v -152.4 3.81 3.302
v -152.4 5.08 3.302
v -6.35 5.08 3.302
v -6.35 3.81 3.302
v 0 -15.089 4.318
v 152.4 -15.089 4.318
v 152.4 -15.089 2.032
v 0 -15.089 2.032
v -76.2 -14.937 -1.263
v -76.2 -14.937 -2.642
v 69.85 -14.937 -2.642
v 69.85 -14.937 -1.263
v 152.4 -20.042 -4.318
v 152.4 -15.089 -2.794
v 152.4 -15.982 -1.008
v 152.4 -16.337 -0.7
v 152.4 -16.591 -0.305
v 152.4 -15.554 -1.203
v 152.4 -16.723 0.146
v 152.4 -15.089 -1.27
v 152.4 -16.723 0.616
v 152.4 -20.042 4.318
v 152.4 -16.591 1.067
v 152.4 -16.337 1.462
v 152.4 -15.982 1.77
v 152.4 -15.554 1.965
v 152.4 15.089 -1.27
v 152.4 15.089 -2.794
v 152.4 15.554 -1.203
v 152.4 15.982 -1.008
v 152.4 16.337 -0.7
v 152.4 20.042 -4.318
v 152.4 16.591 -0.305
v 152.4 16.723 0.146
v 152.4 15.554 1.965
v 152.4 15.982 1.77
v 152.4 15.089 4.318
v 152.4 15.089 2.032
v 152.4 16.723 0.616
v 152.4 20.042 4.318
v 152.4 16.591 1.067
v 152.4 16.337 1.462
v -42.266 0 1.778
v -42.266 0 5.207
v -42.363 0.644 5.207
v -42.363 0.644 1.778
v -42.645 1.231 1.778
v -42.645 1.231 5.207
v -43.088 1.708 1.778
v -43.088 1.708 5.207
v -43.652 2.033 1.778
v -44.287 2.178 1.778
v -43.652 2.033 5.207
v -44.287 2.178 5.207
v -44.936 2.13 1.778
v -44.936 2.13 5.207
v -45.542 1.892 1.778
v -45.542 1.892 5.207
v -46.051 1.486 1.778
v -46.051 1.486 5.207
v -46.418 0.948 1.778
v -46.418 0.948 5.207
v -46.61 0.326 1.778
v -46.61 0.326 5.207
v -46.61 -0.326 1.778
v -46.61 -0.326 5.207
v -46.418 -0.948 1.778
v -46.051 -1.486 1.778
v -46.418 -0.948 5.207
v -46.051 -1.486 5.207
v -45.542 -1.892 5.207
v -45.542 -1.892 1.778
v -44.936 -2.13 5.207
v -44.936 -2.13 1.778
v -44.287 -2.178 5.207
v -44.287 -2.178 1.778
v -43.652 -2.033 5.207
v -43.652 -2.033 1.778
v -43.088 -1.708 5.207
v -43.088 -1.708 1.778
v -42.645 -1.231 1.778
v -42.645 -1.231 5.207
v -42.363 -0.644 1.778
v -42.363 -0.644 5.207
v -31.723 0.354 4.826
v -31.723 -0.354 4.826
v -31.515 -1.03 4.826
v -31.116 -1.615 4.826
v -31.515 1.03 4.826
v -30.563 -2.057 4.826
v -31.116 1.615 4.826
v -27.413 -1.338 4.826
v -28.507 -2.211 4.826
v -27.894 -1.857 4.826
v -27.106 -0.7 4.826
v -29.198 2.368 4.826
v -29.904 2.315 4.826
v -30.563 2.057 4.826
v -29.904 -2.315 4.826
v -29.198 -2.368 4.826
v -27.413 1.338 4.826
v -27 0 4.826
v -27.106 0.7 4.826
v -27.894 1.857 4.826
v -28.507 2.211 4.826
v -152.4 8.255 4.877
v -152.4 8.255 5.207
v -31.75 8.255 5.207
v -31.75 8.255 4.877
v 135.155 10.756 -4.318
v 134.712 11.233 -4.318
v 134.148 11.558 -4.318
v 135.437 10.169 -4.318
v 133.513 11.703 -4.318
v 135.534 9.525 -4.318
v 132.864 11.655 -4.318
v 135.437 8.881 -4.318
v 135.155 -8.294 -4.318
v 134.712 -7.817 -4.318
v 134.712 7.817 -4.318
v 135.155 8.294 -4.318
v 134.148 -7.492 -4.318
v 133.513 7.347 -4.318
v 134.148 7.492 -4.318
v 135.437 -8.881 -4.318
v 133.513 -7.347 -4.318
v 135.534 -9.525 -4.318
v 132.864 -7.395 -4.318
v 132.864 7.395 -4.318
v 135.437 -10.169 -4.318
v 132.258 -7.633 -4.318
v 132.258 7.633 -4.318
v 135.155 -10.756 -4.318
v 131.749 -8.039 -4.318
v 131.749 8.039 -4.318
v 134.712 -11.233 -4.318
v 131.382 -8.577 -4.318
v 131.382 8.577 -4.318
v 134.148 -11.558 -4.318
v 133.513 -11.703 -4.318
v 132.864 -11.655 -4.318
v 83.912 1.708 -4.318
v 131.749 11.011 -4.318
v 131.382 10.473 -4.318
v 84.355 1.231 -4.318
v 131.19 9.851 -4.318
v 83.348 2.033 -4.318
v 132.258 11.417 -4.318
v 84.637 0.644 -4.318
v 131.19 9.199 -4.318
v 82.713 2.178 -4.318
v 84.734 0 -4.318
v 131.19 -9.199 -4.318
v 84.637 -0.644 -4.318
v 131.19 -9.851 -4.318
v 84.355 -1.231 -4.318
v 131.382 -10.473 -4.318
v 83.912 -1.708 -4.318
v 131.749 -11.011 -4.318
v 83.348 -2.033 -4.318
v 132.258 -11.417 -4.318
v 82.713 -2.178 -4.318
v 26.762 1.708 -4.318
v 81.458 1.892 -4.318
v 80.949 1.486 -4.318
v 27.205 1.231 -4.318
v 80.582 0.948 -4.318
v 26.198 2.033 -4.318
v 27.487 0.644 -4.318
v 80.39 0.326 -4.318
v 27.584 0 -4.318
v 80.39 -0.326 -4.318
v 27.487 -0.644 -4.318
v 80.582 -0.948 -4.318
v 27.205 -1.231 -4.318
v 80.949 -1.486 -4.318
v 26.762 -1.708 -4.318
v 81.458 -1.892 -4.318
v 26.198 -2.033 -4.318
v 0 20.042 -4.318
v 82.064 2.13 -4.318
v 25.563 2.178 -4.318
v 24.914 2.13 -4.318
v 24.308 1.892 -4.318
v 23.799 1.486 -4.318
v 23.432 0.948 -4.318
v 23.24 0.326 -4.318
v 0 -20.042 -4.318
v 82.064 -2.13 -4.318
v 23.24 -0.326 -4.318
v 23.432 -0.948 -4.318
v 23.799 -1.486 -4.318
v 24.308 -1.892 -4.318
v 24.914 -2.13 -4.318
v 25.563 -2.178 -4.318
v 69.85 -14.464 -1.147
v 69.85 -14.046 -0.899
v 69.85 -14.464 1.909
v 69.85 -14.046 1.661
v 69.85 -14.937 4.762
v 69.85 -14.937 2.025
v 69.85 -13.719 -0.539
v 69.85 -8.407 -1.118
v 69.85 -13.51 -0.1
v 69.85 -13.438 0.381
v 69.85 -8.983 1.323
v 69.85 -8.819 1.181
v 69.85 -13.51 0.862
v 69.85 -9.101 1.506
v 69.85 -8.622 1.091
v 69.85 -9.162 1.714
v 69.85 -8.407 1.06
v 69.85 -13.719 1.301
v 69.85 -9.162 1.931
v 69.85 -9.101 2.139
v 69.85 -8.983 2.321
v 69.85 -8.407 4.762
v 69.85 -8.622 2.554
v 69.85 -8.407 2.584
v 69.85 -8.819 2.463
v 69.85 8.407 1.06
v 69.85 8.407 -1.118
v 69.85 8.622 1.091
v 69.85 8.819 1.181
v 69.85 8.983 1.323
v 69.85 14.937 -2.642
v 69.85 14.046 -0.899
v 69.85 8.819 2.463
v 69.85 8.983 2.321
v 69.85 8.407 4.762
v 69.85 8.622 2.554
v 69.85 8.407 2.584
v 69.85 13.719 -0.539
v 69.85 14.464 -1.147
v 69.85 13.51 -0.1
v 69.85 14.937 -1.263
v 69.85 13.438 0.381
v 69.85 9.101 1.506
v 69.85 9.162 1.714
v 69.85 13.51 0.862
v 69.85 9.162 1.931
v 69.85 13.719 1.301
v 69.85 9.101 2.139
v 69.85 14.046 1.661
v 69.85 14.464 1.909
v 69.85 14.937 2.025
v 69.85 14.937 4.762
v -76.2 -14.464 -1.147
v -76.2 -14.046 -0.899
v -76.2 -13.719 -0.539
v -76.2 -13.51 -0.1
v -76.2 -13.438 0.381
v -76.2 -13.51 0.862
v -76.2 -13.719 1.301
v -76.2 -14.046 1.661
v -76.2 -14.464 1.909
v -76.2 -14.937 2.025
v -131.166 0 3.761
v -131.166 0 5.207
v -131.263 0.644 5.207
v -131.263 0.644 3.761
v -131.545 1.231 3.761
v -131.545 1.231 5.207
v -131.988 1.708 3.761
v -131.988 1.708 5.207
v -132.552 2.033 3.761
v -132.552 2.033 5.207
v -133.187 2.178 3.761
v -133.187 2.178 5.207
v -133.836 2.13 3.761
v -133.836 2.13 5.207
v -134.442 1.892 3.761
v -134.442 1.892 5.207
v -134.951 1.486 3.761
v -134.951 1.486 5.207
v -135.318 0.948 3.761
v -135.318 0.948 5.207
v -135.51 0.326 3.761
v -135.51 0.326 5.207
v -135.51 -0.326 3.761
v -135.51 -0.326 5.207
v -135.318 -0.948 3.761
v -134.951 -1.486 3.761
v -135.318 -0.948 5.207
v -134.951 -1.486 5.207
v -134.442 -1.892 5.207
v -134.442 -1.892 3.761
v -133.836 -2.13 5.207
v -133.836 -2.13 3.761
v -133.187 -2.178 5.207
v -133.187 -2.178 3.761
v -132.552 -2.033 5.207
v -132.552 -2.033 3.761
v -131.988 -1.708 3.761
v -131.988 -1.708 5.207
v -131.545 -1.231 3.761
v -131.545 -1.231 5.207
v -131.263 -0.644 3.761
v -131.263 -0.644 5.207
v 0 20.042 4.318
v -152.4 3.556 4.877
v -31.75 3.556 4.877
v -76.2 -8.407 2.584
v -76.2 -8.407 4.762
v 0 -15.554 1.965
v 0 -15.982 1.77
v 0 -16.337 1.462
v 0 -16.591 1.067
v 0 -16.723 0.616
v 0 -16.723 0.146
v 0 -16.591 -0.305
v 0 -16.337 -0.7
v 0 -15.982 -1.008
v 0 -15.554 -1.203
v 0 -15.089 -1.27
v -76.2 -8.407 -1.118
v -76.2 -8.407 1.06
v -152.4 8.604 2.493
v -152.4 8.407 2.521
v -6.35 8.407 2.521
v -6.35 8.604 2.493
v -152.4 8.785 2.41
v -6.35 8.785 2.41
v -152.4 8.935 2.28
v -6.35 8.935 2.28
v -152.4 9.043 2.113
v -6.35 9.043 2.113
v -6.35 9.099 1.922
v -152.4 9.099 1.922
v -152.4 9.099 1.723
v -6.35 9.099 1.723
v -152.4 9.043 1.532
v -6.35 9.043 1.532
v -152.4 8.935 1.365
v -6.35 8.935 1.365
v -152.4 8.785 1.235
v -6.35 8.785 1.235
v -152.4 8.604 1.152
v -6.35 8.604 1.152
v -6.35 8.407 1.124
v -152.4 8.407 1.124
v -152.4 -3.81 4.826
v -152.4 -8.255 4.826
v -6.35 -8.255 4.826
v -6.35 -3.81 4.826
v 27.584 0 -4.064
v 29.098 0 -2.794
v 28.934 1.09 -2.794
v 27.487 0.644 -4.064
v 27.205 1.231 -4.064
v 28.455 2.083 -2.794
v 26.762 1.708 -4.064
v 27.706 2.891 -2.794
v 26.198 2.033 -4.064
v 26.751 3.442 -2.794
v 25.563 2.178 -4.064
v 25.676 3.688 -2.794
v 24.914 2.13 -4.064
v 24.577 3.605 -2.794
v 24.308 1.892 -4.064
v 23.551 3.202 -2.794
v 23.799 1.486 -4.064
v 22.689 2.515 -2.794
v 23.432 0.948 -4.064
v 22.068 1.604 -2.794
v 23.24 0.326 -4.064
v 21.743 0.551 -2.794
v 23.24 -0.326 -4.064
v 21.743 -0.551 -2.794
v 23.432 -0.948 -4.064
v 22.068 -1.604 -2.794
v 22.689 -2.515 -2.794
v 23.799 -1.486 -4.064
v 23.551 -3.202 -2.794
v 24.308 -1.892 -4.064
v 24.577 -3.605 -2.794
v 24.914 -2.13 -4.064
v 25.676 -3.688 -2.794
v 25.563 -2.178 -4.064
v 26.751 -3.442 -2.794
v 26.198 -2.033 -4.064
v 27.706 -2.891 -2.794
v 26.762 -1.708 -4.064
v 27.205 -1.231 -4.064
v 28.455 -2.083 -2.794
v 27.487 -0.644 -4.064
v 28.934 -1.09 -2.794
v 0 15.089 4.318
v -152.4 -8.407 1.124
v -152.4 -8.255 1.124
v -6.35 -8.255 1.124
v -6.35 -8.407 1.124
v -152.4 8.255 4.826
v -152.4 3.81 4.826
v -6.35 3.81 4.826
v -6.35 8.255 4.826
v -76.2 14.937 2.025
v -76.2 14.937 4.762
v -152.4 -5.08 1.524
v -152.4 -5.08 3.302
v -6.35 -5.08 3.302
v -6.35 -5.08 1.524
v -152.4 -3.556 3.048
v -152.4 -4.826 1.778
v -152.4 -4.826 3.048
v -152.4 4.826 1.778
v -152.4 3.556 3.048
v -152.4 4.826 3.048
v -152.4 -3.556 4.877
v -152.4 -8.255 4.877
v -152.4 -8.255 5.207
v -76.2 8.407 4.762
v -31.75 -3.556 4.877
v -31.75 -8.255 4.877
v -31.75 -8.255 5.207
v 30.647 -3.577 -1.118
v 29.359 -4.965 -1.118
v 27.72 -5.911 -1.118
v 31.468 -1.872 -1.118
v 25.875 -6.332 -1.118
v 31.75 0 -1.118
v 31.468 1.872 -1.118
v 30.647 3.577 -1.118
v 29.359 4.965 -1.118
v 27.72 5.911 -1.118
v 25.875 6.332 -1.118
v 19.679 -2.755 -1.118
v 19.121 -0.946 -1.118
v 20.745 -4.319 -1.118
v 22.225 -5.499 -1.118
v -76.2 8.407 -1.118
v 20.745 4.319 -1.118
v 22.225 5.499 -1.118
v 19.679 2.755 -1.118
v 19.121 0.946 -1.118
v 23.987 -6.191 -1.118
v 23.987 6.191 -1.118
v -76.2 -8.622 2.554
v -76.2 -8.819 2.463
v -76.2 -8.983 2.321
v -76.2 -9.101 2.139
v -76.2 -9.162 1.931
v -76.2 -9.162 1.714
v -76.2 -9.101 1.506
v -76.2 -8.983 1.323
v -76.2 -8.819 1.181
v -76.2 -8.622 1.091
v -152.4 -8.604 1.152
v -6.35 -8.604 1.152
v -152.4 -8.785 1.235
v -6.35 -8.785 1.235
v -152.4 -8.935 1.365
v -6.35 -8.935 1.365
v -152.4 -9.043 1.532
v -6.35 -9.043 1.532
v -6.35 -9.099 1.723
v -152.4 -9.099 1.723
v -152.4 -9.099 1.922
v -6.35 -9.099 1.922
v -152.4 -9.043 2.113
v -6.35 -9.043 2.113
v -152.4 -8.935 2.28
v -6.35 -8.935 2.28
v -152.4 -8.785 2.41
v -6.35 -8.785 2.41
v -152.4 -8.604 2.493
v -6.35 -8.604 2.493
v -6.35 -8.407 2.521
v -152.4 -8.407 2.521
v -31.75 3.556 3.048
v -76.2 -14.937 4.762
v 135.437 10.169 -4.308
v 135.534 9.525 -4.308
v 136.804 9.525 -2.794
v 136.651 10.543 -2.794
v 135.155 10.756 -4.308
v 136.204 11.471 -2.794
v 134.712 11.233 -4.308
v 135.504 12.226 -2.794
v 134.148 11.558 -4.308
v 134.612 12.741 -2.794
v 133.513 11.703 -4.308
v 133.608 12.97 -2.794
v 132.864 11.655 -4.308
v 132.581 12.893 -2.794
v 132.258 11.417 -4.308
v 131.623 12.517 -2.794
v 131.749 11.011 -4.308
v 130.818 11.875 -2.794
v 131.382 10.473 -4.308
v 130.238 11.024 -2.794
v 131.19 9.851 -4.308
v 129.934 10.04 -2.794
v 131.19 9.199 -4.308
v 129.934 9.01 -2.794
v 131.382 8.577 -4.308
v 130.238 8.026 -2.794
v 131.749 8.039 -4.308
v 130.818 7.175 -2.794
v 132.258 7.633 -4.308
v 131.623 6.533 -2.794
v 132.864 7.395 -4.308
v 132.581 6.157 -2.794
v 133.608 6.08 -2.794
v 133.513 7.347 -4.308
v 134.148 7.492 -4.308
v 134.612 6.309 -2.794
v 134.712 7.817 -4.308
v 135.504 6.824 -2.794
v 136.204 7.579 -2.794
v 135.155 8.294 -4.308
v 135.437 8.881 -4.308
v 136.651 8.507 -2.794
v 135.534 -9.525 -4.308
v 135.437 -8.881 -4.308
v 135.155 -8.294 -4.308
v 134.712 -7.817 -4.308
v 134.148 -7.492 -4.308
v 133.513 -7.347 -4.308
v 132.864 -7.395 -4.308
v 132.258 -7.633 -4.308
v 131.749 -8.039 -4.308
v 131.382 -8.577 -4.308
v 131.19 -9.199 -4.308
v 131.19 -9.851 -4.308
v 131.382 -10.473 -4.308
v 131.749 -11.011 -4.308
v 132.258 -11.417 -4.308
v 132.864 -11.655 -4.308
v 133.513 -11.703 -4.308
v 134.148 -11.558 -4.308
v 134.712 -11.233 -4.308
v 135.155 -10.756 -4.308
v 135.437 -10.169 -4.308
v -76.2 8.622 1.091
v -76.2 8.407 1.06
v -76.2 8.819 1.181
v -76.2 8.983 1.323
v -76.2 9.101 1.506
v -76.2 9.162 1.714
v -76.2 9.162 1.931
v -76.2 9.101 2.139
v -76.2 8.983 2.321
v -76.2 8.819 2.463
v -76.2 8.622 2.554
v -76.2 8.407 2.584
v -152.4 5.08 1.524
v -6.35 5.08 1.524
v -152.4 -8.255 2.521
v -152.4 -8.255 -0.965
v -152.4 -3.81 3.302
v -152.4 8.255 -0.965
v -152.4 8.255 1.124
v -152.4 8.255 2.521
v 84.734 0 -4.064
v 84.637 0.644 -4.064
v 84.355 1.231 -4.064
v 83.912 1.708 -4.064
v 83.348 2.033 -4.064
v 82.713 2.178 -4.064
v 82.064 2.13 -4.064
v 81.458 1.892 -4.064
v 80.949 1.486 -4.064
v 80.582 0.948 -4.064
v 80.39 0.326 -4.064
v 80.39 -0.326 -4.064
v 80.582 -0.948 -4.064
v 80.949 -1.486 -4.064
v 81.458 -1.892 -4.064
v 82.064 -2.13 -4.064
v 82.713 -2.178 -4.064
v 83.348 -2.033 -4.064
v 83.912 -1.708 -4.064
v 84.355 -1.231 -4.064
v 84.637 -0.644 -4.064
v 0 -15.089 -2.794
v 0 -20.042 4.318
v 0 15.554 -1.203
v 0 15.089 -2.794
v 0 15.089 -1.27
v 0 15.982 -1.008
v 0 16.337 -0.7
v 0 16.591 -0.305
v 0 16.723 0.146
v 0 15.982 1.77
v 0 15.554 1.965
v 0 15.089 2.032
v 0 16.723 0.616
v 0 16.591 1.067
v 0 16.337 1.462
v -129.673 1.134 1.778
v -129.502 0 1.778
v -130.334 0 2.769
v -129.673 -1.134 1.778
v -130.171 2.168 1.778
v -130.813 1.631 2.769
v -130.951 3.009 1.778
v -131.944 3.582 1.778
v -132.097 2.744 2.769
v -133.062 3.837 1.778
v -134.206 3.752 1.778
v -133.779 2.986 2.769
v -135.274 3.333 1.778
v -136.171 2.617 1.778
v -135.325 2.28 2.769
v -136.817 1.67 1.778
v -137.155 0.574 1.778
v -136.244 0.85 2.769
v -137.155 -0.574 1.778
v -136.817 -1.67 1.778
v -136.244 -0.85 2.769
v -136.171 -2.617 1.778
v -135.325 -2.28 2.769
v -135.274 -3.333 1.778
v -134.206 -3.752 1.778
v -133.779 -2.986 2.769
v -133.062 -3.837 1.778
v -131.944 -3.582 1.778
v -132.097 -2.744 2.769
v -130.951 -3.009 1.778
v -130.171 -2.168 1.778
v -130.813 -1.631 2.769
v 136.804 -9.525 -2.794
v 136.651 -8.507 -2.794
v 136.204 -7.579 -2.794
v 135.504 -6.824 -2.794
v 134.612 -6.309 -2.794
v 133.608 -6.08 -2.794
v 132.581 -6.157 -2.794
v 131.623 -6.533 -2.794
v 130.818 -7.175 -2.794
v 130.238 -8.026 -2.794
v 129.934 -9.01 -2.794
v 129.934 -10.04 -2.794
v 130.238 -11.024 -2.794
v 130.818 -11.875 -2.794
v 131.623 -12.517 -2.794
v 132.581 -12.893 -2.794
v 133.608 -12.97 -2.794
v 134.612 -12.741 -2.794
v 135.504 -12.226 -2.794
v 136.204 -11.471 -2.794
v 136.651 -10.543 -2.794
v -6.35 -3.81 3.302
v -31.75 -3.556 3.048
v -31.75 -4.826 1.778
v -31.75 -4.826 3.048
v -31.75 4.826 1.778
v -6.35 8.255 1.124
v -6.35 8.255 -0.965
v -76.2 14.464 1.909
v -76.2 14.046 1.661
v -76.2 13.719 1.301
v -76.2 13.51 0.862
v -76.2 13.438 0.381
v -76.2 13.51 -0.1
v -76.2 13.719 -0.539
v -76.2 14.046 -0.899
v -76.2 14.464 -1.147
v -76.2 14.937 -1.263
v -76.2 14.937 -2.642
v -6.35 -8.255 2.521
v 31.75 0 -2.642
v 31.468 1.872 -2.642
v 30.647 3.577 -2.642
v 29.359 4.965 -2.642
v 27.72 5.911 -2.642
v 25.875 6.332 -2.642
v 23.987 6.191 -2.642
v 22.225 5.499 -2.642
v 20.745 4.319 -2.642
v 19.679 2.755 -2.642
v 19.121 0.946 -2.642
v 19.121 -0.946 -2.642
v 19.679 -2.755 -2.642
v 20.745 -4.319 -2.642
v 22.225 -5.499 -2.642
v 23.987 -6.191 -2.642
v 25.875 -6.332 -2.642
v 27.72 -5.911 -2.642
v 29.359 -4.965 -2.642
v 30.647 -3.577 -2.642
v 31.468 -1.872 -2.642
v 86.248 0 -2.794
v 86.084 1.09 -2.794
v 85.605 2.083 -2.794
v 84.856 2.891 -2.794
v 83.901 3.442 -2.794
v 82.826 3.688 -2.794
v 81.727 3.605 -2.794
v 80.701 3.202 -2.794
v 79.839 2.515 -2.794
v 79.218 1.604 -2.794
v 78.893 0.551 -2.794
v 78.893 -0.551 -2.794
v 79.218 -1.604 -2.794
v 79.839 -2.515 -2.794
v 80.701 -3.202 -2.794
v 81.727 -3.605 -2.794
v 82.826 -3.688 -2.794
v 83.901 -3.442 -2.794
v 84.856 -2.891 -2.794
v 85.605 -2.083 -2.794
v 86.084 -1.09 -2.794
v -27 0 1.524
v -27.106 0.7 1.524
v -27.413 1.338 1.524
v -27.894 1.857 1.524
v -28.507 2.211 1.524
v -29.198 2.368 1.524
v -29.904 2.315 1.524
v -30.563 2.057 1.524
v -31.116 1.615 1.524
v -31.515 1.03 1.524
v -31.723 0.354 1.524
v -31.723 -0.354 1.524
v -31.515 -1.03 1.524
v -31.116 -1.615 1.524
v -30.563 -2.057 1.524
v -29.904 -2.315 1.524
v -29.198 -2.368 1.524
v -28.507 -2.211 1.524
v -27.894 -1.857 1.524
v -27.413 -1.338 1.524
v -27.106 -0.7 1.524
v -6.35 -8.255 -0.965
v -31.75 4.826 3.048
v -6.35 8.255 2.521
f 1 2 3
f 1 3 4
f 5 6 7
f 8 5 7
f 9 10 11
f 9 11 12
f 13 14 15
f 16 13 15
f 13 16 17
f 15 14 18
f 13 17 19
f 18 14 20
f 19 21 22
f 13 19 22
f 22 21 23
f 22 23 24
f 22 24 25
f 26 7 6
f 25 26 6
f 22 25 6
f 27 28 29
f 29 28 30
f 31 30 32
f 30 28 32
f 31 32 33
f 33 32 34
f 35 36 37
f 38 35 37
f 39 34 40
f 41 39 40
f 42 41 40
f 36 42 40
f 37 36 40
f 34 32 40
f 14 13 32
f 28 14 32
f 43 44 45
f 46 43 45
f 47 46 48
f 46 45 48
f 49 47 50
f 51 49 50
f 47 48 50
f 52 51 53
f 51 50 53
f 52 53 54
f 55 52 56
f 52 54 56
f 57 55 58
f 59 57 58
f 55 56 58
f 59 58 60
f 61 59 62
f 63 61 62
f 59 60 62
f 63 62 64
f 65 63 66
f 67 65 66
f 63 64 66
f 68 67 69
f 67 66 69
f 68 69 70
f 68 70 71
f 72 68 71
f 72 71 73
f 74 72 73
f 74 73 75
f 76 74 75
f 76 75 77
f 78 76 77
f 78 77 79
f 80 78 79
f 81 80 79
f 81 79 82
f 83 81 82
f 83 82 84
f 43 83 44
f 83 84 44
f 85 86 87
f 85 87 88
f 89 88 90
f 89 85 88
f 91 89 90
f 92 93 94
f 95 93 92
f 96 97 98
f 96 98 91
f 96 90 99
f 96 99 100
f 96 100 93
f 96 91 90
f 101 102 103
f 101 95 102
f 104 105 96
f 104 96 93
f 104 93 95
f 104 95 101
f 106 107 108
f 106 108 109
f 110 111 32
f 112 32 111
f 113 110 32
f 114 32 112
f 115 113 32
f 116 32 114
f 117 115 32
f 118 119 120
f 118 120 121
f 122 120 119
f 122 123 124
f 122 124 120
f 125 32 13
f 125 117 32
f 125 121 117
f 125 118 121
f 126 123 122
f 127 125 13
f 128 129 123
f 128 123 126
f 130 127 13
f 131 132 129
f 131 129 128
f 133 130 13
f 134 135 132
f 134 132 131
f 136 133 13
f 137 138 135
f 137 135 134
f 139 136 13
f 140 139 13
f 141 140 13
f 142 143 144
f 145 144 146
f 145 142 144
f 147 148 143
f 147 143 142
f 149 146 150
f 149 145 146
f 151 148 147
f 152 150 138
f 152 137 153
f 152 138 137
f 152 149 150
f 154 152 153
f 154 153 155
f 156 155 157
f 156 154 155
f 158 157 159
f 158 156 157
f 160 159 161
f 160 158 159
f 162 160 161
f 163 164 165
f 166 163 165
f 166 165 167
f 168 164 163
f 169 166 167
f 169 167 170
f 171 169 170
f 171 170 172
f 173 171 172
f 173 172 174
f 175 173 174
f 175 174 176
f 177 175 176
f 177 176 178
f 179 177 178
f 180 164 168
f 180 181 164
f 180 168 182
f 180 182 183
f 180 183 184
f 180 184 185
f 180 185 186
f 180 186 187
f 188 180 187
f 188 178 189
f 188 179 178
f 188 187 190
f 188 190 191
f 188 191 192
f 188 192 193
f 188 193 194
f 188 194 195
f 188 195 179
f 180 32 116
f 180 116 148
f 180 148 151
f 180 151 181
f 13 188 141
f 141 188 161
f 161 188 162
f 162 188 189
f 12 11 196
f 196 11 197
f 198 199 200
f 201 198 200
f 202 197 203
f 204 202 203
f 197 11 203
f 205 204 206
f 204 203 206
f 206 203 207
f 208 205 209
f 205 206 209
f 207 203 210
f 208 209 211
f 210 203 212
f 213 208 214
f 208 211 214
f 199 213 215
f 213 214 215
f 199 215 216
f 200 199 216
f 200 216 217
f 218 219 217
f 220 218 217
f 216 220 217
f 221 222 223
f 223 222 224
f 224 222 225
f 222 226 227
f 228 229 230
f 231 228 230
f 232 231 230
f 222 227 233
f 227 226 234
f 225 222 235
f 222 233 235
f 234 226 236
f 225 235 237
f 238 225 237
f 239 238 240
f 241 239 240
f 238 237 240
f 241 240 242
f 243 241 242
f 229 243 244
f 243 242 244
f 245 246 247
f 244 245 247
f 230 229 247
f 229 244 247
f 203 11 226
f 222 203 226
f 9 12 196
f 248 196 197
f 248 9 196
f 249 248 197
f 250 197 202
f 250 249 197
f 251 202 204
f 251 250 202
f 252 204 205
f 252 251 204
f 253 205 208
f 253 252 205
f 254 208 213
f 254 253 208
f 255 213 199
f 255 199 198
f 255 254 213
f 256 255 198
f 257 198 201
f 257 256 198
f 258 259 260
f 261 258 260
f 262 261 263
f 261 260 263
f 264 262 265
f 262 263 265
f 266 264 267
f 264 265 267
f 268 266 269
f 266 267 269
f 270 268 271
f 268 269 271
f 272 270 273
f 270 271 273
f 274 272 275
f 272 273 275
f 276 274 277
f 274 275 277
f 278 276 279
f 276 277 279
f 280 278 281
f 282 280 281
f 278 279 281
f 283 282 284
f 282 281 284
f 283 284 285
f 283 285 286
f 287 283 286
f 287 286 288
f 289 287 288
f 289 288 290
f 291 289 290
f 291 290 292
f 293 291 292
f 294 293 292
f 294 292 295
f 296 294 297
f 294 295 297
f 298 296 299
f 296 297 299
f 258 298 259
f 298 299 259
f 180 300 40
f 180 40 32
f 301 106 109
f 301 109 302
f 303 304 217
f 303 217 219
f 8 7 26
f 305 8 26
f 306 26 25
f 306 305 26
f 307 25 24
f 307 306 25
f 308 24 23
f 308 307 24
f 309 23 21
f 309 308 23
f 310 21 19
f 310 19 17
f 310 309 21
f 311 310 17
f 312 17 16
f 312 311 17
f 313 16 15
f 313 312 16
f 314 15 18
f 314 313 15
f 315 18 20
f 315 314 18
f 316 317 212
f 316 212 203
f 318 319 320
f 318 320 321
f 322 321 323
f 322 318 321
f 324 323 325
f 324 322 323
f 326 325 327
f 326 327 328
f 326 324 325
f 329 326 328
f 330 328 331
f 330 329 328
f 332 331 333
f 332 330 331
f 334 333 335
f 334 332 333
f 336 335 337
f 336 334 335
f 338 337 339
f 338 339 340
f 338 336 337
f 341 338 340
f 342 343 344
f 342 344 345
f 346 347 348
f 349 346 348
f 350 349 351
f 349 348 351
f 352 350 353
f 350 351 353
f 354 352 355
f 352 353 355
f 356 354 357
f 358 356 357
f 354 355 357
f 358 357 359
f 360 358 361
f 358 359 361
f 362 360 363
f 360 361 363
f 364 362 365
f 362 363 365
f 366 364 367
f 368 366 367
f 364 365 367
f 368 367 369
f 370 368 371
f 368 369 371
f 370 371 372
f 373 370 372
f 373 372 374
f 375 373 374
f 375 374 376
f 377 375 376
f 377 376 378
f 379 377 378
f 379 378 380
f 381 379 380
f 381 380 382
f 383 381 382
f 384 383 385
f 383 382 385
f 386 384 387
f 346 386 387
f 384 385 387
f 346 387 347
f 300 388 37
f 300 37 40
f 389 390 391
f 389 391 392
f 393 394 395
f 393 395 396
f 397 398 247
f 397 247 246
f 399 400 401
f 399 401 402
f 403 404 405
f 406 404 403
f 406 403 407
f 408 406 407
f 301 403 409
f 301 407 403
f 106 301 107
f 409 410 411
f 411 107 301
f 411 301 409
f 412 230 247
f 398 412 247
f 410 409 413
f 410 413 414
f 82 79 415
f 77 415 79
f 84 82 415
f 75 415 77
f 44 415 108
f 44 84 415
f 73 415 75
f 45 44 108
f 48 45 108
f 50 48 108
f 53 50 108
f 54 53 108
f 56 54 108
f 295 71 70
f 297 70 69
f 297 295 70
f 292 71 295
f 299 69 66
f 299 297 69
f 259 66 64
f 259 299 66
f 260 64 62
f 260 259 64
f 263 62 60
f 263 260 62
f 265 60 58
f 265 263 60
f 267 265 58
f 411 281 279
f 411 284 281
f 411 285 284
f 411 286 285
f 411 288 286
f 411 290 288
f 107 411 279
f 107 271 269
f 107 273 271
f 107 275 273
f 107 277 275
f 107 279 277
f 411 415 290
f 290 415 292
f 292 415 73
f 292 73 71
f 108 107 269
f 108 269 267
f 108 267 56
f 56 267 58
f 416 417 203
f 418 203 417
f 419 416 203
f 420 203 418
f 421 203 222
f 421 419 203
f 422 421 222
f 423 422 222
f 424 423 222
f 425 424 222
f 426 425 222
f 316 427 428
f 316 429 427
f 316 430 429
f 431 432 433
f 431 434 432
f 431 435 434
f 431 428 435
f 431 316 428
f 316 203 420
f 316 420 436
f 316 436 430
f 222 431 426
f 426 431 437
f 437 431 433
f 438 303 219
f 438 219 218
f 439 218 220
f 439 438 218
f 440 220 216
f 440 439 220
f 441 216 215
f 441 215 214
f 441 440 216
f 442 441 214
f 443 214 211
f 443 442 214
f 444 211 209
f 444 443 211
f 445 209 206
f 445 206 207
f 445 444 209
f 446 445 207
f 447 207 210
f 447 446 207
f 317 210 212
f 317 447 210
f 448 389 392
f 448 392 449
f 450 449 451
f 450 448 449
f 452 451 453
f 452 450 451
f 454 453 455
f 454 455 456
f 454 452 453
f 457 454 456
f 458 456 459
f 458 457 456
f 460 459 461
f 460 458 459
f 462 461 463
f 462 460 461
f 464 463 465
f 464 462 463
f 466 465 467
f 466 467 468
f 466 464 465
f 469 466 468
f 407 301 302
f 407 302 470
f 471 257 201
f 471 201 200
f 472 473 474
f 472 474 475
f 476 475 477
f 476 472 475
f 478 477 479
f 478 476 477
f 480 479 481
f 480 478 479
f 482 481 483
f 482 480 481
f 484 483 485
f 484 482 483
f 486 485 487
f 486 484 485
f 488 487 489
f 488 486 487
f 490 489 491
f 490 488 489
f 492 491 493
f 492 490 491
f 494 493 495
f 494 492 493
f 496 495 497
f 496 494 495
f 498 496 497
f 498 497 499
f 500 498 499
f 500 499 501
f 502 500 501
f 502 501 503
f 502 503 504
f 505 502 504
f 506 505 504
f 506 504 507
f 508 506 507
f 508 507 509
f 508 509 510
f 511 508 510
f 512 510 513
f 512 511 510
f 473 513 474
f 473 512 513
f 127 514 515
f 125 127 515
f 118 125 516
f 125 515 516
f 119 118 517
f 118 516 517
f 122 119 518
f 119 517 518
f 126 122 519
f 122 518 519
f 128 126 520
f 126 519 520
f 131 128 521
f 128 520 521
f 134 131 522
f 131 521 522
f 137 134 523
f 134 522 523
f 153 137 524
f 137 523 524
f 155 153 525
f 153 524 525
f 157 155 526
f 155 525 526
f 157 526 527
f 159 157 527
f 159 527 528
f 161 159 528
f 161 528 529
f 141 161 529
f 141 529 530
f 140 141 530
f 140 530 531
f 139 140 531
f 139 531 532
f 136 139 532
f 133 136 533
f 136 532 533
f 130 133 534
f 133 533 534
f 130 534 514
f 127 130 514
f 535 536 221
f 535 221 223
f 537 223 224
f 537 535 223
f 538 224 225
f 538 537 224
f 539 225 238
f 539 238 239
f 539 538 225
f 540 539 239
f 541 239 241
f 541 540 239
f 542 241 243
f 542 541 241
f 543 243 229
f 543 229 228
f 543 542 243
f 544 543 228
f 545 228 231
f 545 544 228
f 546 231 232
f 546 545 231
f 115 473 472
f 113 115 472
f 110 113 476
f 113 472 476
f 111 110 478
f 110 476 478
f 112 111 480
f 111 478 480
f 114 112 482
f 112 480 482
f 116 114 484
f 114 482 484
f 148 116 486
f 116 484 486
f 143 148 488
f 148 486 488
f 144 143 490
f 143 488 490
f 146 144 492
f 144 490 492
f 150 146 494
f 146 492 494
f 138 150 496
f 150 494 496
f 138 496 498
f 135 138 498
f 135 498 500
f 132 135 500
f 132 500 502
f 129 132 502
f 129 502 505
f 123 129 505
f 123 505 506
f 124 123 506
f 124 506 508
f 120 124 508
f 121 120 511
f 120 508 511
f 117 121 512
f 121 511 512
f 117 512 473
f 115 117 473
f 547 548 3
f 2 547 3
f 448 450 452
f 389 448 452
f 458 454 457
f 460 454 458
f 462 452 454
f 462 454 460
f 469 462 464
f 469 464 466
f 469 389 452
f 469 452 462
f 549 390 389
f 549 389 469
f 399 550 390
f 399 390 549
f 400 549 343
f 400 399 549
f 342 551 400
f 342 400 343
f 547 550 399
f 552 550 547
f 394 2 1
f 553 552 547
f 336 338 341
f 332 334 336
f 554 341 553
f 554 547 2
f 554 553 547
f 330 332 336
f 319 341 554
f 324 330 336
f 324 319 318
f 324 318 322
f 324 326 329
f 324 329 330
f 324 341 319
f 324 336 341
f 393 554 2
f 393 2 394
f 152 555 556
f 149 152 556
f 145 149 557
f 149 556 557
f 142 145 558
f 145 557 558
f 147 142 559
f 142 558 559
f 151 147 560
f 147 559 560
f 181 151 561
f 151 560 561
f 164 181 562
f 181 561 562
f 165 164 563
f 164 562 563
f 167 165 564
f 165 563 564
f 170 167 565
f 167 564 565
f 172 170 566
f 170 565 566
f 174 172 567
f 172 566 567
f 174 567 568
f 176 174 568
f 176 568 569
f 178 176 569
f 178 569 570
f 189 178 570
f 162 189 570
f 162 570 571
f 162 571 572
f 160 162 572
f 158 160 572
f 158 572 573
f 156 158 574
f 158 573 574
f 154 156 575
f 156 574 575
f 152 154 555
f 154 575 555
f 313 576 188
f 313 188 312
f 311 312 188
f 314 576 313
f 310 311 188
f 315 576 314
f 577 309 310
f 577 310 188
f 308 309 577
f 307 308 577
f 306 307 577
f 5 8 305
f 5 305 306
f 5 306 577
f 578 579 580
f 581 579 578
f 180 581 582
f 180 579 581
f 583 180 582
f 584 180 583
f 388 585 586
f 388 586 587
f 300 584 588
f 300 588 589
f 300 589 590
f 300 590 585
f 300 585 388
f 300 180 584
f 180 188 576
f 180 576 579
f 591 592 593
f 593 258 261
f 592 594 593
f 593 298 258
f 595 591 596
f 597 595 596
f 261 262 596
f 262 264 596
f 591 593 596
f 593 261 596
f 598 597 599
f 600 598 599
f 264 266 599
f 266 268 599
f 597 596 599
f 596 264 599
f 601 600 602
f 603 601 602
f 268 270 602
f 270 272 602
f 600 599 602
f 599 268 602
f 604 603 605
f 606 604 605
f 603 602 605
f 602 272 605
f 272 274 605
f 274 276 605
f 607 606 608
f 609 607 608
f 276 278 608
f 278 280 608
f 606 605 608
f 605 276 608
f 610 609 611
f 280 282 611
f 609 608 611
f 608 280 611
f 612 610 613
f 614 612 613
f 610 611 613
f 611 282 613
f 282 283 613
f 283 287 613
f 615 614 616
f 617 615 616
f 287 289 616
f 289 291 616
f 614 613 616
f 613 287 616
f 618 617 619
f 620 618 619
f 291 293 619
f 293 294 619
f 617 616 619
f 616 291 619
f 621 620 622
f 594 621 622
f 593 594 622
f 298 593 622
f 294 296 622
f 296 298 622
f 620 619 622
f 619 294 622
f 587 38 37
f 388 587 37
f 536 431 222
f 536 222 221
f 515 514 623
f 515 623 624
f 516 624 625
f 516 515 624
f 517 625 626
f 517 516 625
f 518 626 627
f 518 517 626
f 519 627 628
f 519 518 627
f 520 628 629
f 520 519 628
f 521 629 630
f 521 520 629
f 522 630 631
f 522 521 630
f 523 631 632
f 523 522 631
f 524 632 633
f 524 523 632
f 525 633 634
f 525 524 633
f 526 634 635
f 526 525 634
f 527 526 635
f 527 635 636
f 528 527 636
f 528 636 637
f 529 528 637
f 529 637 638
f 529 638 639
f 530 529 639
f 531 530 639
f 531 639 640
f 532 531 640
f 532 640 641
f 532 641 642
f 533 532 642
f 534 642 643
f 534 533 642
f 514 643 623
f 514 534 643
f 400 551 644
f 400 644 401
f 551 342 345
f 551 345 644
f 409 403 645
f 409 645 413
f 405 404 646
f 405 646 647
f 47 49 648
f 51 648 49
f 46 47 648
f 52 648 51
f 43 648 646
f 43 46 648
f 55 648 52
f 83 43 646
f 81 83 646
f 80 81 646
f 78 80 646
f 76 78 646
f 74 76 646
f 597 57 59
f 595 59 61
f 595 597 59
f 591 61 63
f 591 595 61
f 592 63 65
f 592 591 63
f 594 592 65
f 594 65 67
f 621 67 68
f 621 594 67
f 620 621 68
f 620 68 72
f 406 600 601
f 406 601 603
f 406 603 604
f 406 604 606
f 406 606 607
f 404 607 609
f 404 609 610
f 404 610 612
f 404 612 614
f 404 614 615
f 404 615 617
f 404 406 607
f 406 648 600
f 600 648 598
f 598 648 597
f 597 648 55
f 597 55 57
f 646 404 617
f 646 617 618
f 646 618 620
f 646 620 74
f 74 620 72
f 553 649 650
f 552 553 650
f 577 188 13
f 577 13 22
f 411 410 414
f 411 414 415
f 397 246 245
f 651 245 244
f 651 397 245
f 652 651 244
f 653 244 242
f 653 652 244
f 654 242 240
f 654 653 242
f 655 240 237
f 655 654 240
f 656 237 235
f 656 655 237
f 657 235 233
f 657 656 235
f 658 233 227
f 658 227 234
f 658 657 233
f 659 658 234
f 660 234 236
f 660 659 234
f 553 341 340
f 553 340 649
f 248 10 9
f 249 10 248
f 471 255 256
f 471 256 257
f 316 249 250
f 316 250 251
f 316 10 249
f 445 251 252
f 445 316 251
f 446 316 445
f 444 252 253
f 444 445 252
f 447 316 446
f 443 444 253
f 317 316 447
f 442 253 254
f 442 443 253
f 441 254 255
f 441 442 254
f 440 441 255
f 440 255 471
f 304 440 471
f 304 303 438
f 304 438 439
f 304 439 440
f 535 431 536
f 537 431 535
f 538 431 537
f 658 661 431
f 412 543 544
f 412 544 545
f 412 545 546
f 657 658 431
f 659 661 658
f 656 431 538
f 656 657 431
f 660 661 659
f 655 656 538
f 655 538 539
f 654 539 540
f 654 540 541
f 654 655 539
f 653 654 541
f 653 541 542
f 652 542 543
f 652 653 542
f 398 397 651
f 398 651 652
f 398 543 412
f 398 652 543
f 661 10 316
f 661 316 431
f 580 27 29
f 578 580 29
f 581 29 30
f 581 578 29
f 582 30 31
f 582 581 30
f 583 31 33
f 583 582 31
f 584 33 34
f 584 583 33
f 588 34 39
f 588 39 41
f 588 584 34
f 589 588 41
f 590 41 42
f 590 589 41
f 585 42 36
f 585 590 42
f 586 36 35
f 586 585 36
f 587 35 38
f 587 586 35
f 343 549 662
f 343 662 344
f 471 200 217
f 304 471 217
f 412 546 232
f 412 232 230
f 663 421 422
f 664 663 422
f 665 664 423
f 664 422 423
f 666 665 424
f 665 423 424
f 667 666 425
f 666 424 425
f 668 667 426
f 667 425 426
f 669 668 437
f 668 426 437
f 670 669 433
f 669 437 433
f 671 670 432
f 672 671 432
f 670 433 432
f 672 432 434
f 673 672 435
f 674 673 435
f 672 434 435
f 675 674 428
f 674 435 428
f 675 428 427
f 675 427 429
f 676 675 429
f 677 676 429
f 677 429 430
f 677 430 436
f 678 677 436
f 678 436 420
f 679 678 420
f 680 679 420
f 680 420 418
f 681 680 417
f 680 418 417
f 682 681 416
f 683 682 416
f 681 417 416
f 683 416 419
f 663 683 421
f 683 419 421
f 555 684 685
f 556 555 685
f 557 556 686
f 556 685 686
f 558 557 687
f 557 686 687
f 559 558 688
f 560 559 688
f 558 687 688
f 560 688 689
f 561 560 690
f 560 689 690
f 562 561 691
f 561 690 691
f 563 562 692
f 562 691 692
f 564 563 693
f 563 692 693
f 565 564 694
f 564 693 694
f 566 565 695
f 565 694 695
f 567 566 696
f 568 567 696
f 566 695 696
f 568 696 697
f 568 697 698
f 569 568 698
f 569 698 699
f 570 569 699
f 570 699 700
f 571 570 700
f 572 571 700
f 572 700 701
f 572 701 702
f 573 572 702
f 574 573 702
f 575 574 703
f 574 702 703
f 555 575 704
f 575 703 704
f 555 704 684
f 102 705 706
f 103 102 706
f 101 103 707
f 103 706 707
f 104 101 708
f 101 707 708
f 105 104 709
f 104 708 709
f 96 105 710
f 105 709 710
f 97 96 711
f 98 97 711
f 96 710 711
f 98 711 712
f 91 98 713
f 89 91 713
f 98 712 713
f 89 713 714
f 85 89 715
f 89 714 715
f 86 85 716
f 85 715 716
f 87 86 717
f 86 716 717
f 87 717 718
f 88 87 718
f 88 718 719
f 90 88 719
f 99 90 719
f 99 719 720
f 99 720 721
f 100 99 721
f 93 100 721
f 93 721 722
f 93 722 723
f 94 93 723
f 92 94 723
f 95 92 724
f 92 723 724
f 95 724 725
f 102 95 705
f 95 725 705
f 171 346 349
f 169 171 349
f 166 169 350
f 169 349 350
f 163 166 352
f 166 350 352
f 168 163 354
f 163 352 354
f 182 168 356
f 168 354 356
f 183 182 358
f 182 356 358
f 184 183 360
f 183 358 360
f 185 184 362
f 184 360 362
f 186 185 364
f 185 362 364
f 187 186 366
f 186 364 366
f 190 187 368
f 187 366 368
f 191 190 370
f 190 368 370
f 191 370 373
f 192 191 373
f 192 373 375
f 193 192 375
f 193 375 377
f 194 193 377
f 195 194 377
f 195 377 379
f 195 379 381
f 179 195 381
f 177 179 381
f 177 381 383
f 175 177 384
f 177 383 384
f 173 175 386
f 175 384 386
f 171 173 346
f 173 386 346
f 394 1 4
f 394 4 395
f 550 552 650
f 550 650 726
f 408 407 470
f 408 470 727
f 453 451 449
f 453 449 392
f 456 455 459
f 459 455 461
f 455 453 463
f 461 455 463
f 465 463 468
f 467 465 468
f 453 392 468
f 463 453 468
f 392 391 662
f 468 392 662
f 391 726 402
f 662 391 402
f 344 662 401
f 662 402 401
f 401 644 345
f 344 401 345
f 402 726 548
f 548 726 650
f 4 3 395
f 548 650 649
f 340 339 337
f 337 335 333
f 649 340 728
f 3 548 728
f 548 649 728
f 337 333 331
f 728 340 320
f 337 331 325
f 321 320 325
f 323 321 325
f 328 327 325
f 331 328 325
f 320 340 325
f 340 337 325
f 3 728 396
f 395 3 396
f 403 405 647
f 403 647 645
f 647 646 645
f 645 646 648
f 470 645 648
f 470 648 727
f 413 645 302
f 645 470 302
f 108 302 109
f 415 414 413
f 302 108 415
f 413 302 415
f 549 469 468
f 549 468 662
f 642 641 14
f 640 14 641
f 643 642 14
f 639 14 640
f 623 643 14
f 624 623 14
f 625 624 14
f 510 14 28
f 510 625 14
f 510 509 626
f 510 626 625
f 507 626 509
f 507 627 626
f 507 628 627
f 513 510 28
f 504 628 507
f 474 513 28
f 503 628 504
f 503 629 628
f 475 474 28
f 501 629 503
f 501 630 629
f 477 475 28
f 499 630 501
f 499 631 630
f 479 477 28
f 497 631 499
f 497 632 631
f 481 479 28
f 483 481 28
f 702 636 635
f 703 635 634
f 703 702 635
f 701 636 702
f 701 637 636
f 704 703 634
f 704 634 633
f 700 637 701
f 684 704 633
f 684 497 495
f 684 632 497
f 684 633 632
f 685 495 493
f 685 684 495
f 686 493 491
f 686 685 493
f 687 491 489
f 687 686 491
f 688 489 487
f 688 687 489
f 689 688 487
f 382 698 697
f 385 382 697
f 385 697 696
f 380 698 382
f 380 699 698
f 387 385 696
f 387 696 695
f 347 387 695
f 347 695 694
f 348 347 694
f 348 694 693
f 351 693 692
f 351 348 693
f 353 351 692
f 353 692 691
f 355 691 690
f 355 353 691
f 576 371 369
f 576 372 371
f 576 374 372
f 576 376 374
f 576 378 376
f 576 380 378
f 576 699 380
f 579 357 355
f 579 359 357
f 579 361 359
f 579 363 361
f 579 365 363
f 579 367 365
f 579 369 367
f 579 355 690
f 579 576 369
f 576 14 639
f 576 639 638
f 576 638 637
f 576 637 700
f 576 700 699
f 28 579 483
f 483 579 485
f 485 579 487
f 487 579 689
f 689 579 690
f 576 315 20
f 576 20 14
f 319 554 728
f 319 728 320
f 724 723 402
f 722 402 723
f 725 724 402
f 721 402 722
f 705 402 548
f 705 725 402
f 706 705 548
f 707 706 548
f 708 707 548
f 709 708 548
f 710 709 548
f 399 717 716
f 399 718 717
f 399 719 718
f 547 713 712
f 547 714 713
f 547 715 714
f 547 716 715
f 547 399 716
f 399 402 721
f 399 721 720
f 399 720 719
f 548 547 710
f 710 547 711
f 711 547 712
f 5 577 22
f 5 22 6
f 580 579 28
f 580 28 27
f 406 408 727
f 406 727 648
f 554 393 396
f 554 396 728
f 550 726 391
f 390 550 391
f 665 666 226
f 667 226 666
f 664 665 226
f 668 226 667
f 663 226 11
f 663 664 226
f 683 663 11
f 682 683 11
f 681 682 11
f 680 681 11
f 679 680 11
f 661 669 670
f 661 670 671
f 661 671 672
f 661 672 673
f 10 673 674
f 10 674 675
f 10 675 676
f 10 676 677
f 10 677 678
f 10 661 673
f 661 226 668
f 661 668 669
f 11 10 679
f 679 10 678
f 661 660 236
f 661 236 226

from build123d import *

# Parameters (mm, degrees)
EXTRUDE1_DEPTH        = 152.4
EXTRUDE2_DEPTH        = 146.05
EXTRUDE3_DEPTH        = 146.05
SKETCH9_R             = 2.3749
EXTRUDE4_DEPTH        = 3.302
EXTRUDE5_DEPTH        = 120.65
SKETCH4_R             = 2.1844
CUT_EXTRUDE1_DEPTH    = 1.524
CHAMFER1_SIZE         = 1.27
CHAMFER1_SIZE2        = 1.513527063
CHAMFER1_PART_2_SIZE  = 1.27
CHAMFER1_PART_2_SIZE2 = 1.513527063
CHAMFER1_PART_3_SIZE  = 1.27
CHAMFER1_PART_3_SIZE2 = 1.513527063
SKETCH5_R             = 6.35
CUT_EXTRUDE2_DEPTH    = 1.524
SKETCH6_R             = 2.1844
CUT_EXTRUDE3_DEPTH    = 3.429
CHAMFER2_SIZE         = 1.6637
CHAMFER2_SIZE2        = 1.982720452


with BuildPart() as part:
    # Sketch1 → Extrude1 (new body)
    with BuildSketch(Plane(origin=(0, 0, 0), x_dir=(0, 0, -1), z_dir=(1, 0, 0))):
        with BuildLine():
            Line((-4.318, 20.0421875), (4.318, 20.0421875))
            Line((4.318, 20.0421875), (4.318, -20.0421875))
            Line((4.318, -20.0421875), (-4.318, -20.0421875))
            Line((-4.318, -20.0421875), (-4.318, -15.0891875))
            Line((-4.318, -15.0891875), (-2.032, -15.0891875))
            ThreePointArc((-2.032, -15.0891875), (-0.381, -16.7401875), (1.27, -15.0891875))
            Line((1.27, -15.0891875), (2.794, -15.0891875))
            Line((2.794, -15.0891875), (2.794, 15.0891875))
            Line((2.794, 15.0891875), (1.27, 15.0891875))
            ThreePointArc((1.27, 15.0891875), (-0.381, 16.7401875), (-2.032, 15.0891875))
            Line((-2.032, 15.0891875), (-4.318, 15.0891875))
            Line((-4.318, 15.0891875), (-4.318, 20.0421875))
        make_face()
    extrude(amount=EXTRUDE1_DEPTH)

    # Sketch4 → Cut-Extrude1 (cut)
    with BuildSketch(Plane.XY.offset(-2.794)):
        with Locations((133.35, 9.525)):
            Circle(SKETCH4_R)
        with Locations((133.35, -9.525)):
            Circle(SKETCH4_R)
        with Locations((82.55, 0)):
            Circle(SKETCH4_R)
        with Locations((25.4, 0)):
            Circle(SKETCH4_R)
    extrude(amount=-CUT_EXTRUDE1_DEPTH, mode=Mode.SUBTRACT)

    # Chamfer1
    chamfer1_edges = [part.edges().sort_by_distance(p)[0] for p in [
        (131.1656, 9.525, -2.794),
        (131.1656, -9.525, -2.794),
    ]]
    chamfer1_side = [part.faces().sort_by_distance(p)[0] for p in [
        (75.96932574, 0, -2.794),
    ]]
    chamfer(chamfer1_edges, length=CHAMFER1_SIZE, length2=CHAMFER1_SIZE2, reference=chamfer1_side[0])

    # Chamfer1 part 2
    chamfer1_part_2_edges = [part.edges().sort_by_distance(p)[0] for p in [
        (80.3656, 0, -2.794),
    ]]
    chamfer1_part_2_side = [part.faces().sort_by_distance(p)[0] for p in [
        (80.3656, 0, -3.556),
    ]]
    chamfer(chamfer1_part_2_edges, length=CHAMFER1_PART_2_SIZE, length2=CHAMFER1_PART_2_SIZE2, reference=chamfer1_part_2_side[0])

    # Chamfer1 part 3
    chamfer1_part_3_edges = [part.edges().sort_by_distance(p)[0] for p in [
        (23.2156, 0, -2.794),
    ]]
    chamfer1_part_3_side = [part.faces().sort_by_distance(p)[0] for p in [
        (23.2156, 0, -3.556),
    ]]
    chamfer(chamfer1_part_3_edges, length=CHAMFER1_PART_3_SIZE, length2=CHAMFER1_PART_3_SIZE2, reference=chamfer1_part_3_side[0])


with BuildPart() as body_2:
    # Sketch2 → Extrude2 (new body)
    with BuildSketch(Plane(origin=(-76.2, 0, 0), x_dir=(0, 0, -1), z_dir=(1, 0, 0))):
        with BuildLine():
            Line((-4.7625, 14.9367875), (-2.024951106, 14.9367875))
            ThreePointArc((-2.024951106, 14.9367875), (-0.381, 13.4381875), (1.262951106, 14.9367875))
            Line((1.262951106, 14.9367875), (2.6416, 14.9367875))
            Line((2.6416, 14.9367875), (2.6416, -14.9367875))
            Line((2.6416, -14.9367875), (1.262951106, -14.9367875))
            ThreePointArc((1.262951106, -14.9367875), (-0.381, -13.4381875), (-2.024951106, -14.9367875))
            Line((-2.024951106, -14.9367875), (-4.7625, -14.9367875))
            Line((-4.7625, -14.9367875), (-4.7625, -8.4074))
            Line((-4.7625, -8.4074), (-2.58445, -8.4074))
            ThreePointArc((-2.58445, -8.4074), (-1.82245, -9.1694), (-1.06045, -8.4074))
            Line((-1.06045, -8.4074), (1.1176, -8.4074))
            Line((1.1176, -8.4074), (1.1176, 8.4074))
            Line((1.1176, 8.4074), (-1.06045, 8.4074))
            ThreePointArc((-1.06045, 8.4074), (-1.82245, 9.1694), (-2.58445, 8.4074))
            Line((-2.58445, 8.4074), (-4.7625, 8.4074))
            Line((-4.7625, 8.4074), (-4.7625, 14.9367875))
        make_face()
    extrude(amount=EXTRUDE2_DEPTH)

    # Sketch5 → Cut-Extrude2 (cut)
    with BuildSketch(Plane.XY.offset(-1.1176)):
        with Locations((25.4, 0)):
            Circle(SKETCH5_R)
        with Locations((82.55, 0)):
            Circle(SKETCH5_R)
    extrude(amount=-CUT_EXTRUDE2_DEPTH, mode=Mode.SUBTRACT)


with BuildPart() as body_3:
    # Sketch3 → Extrude3 (new body)
    with BuildSketch(Plane(origin=(-152.4, 0, 0), x_dir=(0, 0, -1), z_dir=(1, 0, 0))):
        with BuildLine():
            Line((-4.826, 8.255), (-2.52095, 8.255))
            Line((-2.52095, 8.255), (-2.52095, 8.4074))
            ThreePointArc((-2.52095, 8.4074), (-1.82245, 9.1059), (-1.12395, 8.4074))
            Line((-1.12395, 8.4074), (-1.12395, 8.255))
            Line((-1.12395, 8.255), (0.9652, 8.255))
            Line((0.9652, 8.255), (0.9652, -8.255))
            Line((0.9652, -8.255), (-1.12395, -8.255))
            Line((-1.12395, -8.255), (-1.12395, -8.4074))
            ThreePointArc((-1.12395, -8.4074), (-1.82245, -9.1059), (-2.52095, -8.4074))
            Line((-2.52095, -8.4074), (-2.52095, -8.255))
            Line((-2.52095, -8.255), (-4.826, -8.255))
            Line((-4.826, -8.255), (-4.826, -3.81))
            Line((-4.826, -3.81), (-3.302, -3.81))
            Line((-3.302, -3.81), (-3.302, -5.08))
            Line((-3.302, -5.08), (-1.524, -5.08))
            Line((-1.524, -5.08), (-1.524, 5.08))
            Line((-1.524, 5.08), (-3.302, 5.08))
            Line((-3.302, 5.08), (-3.302, 3.81))
            Line((-3.302, 3.81), (-4.826, 3.81))
            Line((-4.826, 3.81), (-4.826, 8.255))
        make_face()
    extrude(amount=EXTRUDE3_DEPTH)

    # Sketch9 → Extrude4 (add)
    with BuildSketch(Plane.XY.offset(1.524)):
        with Locations((-29.3751, 0)):
            Circle(SKETCH9_R)
    extrude(amount=EXTRUDE4_DEPTH)


with BuildPart() as body_4:
    # Sketch10 → Extrude5 (new body)
    with BuildSketch(Plane(origin=(-152.4, 0, 0), x_dir=(0, 0, -1), z_dir=(1, 0, 0))):
        Polygon((-4.8768, 8.255), (-4.8768, 3.556), (-3.048, 3.556), (-3.048, 4.826), (-1.778, 4.826), (-1.778, -4.826), (-3.048, -4.826), (-3.048, -3.556), (-4.8768, -3.556), (-4.8768, -8.255), (-5.207, -8.255), (-5.207, 8.255), align=None)
    extrude(amount=EXTRUDE5_DEPTH)

    # Sketch6 → Cut-Extrude3 (cut)
    with BuildSketch(Plane.XY.offset(5.207)):
        with Locations((-133.35, 0)):
            Circle(SKETCH6_R)
        with Locations((-44.45, 0)):
            Circle(SKETCH6_R)
    extrude(amount=-CUT_EXTRUDE3_DEPTH, mode=Mode.SUBTRACT)

    # Chamfer2
    chamfer2_edges = [body_4.edges().sort_by_distance(p)[0] for p in [
        (-135.5344, 0, 1.778),
    ]]
    chamfer2_side = [body_4.faces().sort_by_distance(p)[0] for p in [
        (-92.158901713, 0, 1.778),
    ]]
    chamfer(chamfer2_edges, length=CHAMFER2_SIZE, length2=CHAMFER2_SIZE2, reference=chamfer2_side[0])


solid = Compound([part.part, body_2.part, body_3.part, body_4.part])
